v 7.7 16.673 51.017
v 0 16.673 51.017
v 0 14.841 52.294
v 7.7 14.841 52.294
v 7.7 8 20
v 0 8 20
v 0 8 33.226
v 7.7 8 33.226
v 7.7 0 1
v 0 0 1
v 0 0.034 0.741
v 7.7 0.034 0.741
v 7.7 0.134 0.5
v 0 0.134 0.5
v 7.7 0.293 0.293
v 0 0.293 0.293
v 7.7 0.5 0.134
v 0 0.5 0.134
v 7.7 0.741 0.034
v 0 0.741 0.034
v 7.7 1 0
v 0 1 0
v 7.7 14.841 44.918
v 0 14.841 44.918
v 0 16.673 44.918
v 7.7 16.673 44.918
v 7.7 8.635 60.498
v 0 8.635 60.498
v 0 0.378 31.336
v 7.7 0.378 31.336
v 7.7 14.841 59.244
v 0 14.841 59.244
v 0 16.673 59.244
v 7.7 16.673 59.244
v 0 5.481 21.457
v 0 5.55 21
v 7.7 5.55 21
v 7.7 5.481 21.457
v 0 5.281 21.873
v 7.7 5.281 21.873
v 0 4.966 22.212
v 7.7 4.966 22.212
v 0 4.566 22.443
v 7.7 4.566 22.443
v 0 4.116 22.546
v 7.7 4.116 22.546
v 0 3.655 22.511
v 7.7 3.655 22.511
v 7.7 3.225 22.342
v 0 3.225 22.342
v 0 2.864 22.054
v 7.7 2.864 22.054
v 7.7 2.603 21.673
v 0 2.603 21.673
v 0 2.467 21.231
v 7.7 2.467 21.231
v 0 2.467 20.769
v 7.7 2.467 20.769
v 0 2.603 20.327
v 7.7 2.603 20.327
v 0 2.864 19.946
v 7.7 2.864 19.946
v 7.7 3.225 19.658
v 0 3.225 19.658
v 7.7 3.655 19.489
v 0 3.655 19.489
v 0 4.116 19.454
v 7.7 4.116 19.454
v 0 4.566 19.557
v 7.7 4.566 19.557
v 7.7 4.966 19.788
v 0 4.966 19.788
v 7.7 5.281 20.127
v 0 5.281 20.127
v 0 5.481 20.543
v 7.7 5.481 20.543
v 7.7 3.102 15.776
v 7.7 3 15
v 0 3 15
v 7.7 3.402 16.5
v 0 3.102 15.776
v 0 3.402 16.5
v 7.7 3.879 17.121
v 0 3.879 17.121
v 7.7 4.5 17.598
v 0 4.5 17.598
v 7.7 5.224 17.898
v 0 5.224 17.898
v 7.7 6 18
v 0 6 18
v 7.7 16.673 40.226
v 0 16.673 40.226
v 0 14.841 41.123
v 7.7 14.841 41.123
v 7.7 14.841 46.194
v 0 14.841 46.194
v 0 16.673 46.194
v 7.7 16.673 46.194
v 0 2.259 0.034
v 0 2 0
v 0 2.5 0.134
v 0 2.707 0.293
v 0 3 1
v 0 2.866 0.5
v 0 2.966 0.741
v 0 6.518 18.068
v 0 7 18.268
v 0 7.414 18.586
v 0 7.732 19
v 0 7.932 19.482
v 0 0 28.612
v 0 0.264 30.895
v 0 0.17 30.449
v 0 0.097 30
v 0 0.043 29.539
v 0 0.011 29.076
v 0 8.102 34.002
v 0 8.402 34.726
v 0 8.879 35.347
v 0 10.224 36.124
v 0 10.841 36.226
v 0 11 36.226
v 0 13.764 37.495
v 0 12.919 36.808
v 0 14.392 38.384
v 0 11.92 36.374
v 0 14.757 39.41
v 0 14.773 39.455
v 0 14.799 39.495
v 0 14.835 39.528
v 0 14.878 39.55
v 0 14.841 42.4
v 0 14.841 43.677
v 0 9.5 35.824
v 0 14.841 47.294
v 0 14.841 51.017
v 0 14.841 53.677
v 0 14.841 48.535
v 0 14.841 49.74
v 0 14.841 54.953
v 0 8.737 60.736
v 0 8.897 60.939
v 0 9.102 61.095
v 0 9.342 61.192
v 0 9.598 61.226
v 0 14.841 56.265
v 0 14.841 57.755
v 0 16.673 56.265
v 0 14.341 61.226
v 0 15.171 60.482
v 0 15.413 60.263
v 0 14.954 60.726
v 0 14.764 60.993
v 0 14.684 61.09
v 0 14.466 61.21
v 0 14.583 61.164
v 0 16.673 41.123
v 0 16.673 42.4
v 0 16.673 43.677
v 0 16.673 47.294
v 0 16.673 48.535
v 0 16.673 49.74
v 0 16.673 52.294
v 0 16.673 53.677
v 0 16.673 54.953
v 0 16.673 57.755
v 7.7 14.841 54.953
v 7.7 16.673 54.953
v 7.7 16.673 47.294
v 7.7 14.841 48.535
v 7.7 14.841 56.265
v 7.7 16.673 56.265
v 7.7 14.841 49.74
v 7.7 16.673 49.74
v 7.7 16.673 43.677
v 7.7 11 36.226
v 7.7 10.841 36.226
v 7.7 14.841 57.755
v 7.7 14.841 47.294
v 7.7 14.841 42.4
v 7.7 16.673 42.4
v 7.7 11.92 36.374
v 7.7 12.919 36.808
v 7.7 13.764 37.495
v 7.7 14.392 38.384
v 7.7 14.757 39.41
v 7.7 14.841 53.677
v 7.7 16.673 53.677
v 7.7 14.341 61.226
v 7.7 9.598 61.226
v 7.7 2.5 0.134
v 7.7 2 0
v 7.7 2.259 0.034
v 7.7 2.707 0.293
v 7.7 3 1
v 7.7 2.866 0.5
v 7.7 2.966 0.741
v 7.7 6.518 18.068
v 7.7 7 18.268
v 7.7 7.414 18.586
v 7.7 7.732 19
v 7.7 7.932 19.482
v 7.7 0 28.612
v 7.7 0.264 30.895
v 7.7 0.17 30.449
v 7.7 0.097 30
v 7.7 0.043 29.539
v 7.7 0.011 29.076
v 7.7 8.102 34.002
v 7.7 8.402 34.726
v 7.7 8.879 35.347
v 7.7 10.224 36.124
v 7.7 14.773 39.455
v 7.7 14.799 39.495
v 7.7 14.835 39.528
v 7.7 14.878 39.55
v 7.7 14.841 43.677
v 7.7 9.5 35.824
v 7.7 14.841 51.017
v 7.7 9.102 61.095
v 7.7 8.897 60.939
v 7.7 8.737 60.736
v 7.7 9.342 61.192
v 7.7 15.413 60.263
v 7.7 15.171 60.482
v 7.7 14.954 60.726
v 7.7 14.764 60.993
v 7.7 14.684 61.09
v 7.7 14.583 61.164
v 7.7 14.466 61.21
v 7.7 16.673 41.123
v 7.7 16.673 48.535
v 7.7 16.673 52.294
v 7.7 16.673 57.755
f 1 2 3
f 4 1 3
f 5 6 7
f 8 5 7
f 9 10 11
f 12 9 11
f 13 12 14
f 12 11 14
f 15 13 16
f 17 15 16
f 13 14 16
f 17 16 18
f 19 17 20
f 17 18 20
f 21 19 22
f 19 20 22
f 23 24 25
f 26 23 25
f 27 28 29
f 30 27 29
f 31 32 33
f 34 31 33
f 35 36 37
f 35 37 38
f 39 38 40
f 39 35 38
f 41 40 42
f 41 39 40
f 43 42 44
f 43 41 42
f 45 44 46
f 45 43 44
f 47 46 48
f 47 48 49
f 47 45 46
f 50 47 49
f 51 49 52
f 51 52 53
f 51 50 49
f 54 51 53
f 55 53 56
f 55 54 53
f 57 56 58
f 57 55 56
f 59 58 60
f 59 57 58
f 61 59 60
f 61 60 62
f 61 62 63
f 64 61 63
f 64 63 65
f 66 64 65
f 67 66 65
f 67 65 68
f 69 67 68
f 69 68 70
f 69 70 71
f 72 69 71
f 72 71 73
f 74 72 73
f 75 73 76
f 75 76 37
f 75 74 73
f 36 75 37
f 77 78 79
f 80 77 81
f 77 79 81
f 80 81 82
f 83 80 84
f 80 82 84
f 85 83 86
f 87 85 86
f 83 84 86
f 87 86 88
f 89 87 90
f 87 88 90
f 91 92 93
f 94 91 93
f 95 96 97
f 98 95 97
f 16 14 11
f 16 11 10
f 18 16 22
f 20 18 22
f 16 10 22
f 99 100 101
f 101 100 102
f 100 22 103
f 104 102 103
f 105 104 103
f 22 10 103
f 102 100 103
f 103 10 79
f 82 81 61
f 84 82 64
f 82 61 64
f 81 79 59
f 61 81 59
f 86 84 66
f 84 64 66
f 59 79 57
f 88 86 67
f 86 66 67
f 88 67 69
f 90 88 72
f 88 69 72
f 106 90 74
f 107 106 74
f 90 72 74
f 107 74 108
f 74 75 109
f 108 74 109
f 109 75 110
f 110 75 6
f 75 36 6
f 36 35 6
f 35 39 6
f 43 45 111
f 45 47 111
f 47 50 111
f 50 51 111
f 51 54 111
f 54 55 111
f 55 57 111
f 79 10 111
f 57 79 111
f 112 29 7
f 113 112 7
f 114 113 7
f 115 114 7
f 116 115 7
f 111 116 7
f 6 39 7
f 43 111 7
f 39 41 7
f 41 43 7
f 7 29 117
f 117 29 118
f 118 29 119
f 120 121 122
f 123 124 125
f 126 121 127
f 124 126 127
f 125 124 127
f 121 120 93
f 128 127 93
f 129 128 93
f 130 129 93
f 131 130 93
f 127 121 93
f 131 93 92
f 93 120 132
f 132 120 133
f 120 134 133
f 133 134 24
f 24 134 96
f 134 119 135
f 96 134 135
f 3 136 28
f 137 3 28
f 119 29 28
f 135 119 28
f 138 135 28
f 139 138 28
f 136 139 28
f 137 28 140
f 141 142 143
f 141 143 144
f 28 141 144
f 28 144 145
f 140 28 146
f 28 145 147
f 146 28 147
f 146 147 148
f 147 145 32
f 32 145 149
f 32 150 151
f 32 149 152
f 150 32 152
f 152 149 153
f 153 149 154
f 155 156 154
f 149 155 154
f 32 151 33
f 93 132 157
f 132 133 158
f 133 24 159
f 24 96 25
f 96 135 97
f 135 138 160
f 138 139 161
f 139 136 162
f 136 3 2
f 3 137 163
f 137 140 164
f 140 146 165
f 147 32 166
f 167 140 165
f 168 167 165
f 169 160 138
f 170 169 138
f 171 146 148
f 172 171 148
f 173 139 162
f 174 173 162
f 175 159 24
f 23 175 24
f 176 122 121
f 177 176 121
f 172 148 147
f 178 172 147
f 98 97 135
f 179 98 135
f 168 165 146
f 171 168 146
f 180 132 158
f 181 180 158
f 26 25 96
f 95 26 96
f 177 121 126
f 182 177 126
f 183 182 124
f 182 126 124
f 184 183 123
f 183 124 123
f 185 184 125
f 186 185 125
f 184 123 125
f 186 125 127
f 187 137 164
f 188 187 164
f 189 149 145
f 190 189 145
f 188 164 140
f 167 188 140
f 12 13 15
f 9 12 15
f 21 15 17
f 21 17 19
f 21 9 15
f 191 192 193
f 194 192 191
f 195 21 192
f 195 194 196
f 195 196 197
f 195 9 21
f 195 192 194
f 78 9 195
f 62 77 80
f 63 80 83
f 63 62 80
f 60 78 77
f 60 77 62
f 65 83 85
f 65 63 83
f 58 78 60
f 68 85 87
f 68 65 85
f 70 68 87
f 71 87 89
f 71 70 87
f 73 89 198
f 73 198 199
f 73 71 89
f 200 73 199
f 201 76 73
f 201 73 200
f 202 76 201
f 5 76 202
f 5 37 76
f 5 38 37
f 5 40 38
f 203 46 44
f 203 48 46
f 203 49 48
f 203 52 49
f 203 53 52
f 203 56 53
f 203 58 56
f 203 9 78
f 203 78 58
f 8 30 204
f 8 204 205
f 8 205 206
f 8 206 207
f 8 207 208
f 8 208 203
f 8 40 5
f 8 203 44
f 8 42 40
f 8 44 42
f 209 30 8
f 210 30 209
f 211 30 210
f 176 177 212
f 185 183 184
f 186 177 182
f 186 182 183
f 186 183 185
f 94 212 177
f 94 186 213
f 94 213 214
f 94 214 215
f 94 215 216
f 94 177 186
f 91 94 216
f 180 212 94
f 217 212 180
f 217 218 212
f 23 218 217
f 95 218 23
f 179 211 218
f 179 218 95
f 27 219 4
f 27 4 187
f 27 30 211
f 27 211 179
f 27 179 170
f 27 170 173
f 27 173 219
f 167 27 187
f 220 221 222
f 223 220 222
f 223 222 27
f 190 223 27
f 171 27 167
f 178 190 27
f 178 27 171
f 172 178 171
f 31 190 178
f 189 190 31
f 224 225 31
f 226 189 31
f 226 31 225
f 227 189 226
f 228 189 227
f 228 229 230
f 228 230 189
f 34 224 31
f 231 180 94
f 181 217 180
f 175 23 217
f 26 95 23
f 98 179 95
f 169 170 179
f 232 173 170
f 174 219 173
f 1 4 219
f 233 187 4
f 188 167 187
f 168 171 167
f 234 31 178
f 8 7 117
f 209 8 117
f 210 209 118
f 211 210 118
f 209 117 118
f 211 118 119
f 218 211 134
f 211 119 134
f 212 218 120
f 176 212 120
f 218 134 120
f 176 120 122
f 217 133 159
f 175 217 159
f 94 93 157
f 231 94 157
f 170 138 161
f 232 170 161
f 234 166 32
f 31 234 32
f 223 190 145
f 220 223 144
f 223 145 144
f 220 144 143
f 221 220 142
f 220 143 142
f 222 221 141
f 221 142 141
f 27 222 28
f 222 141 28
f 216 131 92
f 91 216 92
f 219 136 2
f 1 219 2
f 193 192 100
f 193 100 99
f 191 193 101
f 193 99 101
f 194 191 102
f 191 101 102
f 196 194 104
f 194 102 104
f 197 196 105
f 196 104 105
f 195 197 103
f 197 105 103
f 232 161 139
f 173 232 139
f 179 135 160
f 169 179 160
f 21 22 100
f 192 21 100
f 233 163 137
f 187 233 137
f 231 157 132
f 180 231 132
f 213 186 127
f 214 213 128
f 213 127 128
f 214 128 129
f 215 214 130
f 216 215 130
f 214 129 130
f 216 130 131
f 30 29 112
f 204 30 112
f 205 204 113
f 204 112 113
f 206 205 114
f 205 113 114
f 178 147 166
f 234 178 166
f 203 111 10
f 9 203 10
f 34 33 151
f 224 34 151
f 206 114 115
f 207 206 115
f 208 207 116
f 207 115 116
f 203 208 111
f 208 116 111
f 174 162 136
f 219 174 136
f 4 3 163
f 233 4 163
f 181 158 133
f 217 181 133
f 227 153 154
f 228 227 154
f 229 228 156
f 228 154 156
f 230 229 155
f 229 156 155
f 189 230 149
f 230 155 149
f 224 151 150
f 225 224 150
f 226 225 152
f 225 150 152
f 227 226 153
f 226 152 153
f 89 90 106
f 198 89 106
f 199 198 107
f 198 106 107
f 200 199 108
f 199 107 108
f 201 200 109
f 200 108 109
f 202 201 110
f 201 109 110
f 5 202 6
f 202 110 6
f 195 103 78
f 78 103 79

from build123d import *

# Parameters (mm, degrees)
F0_R     = 1.55
F1_DEPTH = 7.7


with BuildPart() as f1:
    # F0 (on Right) → F1 (new body)
    with BuildSketch(Plane.YZ):
        with BuildLine():
            ThreePointArc((0.378257, 31.335913), (0.214732, 30.672765), (0.096856, 30))
            Line((0.096856, 30), (8, 30))
            Line((8, 30), (8, 33.225827))
            ThreePointArc((8, 33.225827), (8.87868, 35.347148), (11, 36.225827))
            Line((11, 36.225827), (10.841426, 36.225827))
            ThreePointArc((10.841426, 36.225827), (13.364842, 37.122221), (14.757271, 39.409641))
            ThreePointArc((14.757271, 39.409641), (14.799371, 39.495296), (14.877529, 39.550072))
            Line((14.877529, 39.550072), (16.67311, 40.225827))
            Line((16.67311, 40.225827), (14.841426, 41.123461))
            Line((14.841426, 41.123461), (14.841426, 42.400047))
            Line((14.841426, 42.400047), (14.841426, 43.676633))
            Line((14.841426, 43.676633), (14.841426, 44.917755))
            Line((14.841426, 44.917755), (14.841426, 46.194341))
            Line((14.841426, 46.194341), (14.841426, 47.293622))
            Line((14.841426, 47.293622), (14.841426, 48.534747))
            Line((14.841426, 48.534747), (14.841426, 49.740411))
            Line((14.841426, 49.740411), (14.841426, 51.016998))
            Line((14.841426, 51.016998), (14.841426, 52.293584))
            Line((14.841426, 52.293584), (14.841426, 53.676549))
            Line((14.841426, 53.676549), (14.841426, 54.953136))
            Line((14.841426, 54.953136), (14.841426, 56.265183))
            Line((14.841426, 56.265183), (14.841426, 57.754532))
            Line((14.841426, 57.754532), (14.841426, 59.24388))
            Line((14.841426, 59.24388), (16.67311, 59.24388))
            Line((16.67311, 59.24388), (15.413323, 60.263127))
            ThreePointArc((15.413323, 60.263127), (15.05882, 60.601418), (14.764118, 60.992907))
            ThreePointArc((14.764118, 60.992907), (14.582735, 61.163743), (14.341426, 61.225827))
            Line((14.341426, 61.225827), (9.597594, 61.225827))
            ThreePointArc((9.597594, 61.225827), (8.99445, 61.02346), (8.63542, 60.498262))
            Line((8.63542, 60.498262), (0.378257, 31.335913))
        make_face()
        with BuildLine():
            Line((0, 28.611568), (0, 1))
            ThreePointArc((0, 1), (0.292893, 0.292893), (1, 0))
            Line((1, 0), (2, 0))
            ThreePointArc((2, 0), (2.707107, 0.292893), (3, 1))
            Line((3, 1), (3, 15))
            ThreePointArc((3, 15), (3.87868, 17.12132), (6, 18))
            ThreePointArc((6, 18), (7.414214, 18.585786), (8, 20))
            Line((8, 20), (8, 30))
            Line((8, 30), (0.096856, 30))
            ThreePointArc((0.096856, 30), (0.024243, 29.307471), (0, 28.611568))
        make_face()
        with Locations((4, 21)):
            Circle(F0_R, mode=Mode.SUBTRACT)
        Polygon((14.841426, 42.400047), (14.841426, 41.123461), (16.67311, 41.123461), align=None)
        Polygon((14.841426, 43.676633), (14.841426, 42.400047), (16.67311, 42.400047), align=None)
        Polygon((14.841426, 44.917755), (14.841426, 43.676633), (16.67311, 43.676633), align=None)
        Polygon((14.841426, 46.194341), (14.841426, 44.917755), (16.67311, 44.917755), align=None)
        Polygon((14.841426, 47.293622), (14.841426, 46.194341), (16.67311, 46.194341), align=None)
        Polygon((16.67311, 49.740411), (14.841426, 51.016998), (14.841426, 49.740411), align=None)
        Polygon((14.841426, 48.534747), (14.841426, 47.293622), (16.67311, 47.293622), align=None)
        Polygon((14.841426, 49.740411), (14.841426, 48.534747), (16.67311, 48.534747), align=None)
        Polygon((16.67311, 51.016998), (14.841426, 52.293584), (14.841426, 51.016998), align=None)
        Polygon((16.67311, 52.293584), (14.841426, 53.676549), (14.841426, 52.293584), align=None)
        Polygon((16.67311, 53.676549), (14.841426, 54.953136), (14.841426, 53.676549), align=None)
        Polygon((16.67311, 54.953136), (14.841426, 56.265183), (14.841426, 54.953136), align=None)
        Polygon((16.67311, 56.265183), (14.841426, 57.754532), (14.841426, 56.265183), align=None)
        Polygon((16.67311, 57.754532), (14.841426, 59.24388), (14.841426, 57.754532), align=None)
    extrude(amount=F1_DEPTH)


solid = f1.part
